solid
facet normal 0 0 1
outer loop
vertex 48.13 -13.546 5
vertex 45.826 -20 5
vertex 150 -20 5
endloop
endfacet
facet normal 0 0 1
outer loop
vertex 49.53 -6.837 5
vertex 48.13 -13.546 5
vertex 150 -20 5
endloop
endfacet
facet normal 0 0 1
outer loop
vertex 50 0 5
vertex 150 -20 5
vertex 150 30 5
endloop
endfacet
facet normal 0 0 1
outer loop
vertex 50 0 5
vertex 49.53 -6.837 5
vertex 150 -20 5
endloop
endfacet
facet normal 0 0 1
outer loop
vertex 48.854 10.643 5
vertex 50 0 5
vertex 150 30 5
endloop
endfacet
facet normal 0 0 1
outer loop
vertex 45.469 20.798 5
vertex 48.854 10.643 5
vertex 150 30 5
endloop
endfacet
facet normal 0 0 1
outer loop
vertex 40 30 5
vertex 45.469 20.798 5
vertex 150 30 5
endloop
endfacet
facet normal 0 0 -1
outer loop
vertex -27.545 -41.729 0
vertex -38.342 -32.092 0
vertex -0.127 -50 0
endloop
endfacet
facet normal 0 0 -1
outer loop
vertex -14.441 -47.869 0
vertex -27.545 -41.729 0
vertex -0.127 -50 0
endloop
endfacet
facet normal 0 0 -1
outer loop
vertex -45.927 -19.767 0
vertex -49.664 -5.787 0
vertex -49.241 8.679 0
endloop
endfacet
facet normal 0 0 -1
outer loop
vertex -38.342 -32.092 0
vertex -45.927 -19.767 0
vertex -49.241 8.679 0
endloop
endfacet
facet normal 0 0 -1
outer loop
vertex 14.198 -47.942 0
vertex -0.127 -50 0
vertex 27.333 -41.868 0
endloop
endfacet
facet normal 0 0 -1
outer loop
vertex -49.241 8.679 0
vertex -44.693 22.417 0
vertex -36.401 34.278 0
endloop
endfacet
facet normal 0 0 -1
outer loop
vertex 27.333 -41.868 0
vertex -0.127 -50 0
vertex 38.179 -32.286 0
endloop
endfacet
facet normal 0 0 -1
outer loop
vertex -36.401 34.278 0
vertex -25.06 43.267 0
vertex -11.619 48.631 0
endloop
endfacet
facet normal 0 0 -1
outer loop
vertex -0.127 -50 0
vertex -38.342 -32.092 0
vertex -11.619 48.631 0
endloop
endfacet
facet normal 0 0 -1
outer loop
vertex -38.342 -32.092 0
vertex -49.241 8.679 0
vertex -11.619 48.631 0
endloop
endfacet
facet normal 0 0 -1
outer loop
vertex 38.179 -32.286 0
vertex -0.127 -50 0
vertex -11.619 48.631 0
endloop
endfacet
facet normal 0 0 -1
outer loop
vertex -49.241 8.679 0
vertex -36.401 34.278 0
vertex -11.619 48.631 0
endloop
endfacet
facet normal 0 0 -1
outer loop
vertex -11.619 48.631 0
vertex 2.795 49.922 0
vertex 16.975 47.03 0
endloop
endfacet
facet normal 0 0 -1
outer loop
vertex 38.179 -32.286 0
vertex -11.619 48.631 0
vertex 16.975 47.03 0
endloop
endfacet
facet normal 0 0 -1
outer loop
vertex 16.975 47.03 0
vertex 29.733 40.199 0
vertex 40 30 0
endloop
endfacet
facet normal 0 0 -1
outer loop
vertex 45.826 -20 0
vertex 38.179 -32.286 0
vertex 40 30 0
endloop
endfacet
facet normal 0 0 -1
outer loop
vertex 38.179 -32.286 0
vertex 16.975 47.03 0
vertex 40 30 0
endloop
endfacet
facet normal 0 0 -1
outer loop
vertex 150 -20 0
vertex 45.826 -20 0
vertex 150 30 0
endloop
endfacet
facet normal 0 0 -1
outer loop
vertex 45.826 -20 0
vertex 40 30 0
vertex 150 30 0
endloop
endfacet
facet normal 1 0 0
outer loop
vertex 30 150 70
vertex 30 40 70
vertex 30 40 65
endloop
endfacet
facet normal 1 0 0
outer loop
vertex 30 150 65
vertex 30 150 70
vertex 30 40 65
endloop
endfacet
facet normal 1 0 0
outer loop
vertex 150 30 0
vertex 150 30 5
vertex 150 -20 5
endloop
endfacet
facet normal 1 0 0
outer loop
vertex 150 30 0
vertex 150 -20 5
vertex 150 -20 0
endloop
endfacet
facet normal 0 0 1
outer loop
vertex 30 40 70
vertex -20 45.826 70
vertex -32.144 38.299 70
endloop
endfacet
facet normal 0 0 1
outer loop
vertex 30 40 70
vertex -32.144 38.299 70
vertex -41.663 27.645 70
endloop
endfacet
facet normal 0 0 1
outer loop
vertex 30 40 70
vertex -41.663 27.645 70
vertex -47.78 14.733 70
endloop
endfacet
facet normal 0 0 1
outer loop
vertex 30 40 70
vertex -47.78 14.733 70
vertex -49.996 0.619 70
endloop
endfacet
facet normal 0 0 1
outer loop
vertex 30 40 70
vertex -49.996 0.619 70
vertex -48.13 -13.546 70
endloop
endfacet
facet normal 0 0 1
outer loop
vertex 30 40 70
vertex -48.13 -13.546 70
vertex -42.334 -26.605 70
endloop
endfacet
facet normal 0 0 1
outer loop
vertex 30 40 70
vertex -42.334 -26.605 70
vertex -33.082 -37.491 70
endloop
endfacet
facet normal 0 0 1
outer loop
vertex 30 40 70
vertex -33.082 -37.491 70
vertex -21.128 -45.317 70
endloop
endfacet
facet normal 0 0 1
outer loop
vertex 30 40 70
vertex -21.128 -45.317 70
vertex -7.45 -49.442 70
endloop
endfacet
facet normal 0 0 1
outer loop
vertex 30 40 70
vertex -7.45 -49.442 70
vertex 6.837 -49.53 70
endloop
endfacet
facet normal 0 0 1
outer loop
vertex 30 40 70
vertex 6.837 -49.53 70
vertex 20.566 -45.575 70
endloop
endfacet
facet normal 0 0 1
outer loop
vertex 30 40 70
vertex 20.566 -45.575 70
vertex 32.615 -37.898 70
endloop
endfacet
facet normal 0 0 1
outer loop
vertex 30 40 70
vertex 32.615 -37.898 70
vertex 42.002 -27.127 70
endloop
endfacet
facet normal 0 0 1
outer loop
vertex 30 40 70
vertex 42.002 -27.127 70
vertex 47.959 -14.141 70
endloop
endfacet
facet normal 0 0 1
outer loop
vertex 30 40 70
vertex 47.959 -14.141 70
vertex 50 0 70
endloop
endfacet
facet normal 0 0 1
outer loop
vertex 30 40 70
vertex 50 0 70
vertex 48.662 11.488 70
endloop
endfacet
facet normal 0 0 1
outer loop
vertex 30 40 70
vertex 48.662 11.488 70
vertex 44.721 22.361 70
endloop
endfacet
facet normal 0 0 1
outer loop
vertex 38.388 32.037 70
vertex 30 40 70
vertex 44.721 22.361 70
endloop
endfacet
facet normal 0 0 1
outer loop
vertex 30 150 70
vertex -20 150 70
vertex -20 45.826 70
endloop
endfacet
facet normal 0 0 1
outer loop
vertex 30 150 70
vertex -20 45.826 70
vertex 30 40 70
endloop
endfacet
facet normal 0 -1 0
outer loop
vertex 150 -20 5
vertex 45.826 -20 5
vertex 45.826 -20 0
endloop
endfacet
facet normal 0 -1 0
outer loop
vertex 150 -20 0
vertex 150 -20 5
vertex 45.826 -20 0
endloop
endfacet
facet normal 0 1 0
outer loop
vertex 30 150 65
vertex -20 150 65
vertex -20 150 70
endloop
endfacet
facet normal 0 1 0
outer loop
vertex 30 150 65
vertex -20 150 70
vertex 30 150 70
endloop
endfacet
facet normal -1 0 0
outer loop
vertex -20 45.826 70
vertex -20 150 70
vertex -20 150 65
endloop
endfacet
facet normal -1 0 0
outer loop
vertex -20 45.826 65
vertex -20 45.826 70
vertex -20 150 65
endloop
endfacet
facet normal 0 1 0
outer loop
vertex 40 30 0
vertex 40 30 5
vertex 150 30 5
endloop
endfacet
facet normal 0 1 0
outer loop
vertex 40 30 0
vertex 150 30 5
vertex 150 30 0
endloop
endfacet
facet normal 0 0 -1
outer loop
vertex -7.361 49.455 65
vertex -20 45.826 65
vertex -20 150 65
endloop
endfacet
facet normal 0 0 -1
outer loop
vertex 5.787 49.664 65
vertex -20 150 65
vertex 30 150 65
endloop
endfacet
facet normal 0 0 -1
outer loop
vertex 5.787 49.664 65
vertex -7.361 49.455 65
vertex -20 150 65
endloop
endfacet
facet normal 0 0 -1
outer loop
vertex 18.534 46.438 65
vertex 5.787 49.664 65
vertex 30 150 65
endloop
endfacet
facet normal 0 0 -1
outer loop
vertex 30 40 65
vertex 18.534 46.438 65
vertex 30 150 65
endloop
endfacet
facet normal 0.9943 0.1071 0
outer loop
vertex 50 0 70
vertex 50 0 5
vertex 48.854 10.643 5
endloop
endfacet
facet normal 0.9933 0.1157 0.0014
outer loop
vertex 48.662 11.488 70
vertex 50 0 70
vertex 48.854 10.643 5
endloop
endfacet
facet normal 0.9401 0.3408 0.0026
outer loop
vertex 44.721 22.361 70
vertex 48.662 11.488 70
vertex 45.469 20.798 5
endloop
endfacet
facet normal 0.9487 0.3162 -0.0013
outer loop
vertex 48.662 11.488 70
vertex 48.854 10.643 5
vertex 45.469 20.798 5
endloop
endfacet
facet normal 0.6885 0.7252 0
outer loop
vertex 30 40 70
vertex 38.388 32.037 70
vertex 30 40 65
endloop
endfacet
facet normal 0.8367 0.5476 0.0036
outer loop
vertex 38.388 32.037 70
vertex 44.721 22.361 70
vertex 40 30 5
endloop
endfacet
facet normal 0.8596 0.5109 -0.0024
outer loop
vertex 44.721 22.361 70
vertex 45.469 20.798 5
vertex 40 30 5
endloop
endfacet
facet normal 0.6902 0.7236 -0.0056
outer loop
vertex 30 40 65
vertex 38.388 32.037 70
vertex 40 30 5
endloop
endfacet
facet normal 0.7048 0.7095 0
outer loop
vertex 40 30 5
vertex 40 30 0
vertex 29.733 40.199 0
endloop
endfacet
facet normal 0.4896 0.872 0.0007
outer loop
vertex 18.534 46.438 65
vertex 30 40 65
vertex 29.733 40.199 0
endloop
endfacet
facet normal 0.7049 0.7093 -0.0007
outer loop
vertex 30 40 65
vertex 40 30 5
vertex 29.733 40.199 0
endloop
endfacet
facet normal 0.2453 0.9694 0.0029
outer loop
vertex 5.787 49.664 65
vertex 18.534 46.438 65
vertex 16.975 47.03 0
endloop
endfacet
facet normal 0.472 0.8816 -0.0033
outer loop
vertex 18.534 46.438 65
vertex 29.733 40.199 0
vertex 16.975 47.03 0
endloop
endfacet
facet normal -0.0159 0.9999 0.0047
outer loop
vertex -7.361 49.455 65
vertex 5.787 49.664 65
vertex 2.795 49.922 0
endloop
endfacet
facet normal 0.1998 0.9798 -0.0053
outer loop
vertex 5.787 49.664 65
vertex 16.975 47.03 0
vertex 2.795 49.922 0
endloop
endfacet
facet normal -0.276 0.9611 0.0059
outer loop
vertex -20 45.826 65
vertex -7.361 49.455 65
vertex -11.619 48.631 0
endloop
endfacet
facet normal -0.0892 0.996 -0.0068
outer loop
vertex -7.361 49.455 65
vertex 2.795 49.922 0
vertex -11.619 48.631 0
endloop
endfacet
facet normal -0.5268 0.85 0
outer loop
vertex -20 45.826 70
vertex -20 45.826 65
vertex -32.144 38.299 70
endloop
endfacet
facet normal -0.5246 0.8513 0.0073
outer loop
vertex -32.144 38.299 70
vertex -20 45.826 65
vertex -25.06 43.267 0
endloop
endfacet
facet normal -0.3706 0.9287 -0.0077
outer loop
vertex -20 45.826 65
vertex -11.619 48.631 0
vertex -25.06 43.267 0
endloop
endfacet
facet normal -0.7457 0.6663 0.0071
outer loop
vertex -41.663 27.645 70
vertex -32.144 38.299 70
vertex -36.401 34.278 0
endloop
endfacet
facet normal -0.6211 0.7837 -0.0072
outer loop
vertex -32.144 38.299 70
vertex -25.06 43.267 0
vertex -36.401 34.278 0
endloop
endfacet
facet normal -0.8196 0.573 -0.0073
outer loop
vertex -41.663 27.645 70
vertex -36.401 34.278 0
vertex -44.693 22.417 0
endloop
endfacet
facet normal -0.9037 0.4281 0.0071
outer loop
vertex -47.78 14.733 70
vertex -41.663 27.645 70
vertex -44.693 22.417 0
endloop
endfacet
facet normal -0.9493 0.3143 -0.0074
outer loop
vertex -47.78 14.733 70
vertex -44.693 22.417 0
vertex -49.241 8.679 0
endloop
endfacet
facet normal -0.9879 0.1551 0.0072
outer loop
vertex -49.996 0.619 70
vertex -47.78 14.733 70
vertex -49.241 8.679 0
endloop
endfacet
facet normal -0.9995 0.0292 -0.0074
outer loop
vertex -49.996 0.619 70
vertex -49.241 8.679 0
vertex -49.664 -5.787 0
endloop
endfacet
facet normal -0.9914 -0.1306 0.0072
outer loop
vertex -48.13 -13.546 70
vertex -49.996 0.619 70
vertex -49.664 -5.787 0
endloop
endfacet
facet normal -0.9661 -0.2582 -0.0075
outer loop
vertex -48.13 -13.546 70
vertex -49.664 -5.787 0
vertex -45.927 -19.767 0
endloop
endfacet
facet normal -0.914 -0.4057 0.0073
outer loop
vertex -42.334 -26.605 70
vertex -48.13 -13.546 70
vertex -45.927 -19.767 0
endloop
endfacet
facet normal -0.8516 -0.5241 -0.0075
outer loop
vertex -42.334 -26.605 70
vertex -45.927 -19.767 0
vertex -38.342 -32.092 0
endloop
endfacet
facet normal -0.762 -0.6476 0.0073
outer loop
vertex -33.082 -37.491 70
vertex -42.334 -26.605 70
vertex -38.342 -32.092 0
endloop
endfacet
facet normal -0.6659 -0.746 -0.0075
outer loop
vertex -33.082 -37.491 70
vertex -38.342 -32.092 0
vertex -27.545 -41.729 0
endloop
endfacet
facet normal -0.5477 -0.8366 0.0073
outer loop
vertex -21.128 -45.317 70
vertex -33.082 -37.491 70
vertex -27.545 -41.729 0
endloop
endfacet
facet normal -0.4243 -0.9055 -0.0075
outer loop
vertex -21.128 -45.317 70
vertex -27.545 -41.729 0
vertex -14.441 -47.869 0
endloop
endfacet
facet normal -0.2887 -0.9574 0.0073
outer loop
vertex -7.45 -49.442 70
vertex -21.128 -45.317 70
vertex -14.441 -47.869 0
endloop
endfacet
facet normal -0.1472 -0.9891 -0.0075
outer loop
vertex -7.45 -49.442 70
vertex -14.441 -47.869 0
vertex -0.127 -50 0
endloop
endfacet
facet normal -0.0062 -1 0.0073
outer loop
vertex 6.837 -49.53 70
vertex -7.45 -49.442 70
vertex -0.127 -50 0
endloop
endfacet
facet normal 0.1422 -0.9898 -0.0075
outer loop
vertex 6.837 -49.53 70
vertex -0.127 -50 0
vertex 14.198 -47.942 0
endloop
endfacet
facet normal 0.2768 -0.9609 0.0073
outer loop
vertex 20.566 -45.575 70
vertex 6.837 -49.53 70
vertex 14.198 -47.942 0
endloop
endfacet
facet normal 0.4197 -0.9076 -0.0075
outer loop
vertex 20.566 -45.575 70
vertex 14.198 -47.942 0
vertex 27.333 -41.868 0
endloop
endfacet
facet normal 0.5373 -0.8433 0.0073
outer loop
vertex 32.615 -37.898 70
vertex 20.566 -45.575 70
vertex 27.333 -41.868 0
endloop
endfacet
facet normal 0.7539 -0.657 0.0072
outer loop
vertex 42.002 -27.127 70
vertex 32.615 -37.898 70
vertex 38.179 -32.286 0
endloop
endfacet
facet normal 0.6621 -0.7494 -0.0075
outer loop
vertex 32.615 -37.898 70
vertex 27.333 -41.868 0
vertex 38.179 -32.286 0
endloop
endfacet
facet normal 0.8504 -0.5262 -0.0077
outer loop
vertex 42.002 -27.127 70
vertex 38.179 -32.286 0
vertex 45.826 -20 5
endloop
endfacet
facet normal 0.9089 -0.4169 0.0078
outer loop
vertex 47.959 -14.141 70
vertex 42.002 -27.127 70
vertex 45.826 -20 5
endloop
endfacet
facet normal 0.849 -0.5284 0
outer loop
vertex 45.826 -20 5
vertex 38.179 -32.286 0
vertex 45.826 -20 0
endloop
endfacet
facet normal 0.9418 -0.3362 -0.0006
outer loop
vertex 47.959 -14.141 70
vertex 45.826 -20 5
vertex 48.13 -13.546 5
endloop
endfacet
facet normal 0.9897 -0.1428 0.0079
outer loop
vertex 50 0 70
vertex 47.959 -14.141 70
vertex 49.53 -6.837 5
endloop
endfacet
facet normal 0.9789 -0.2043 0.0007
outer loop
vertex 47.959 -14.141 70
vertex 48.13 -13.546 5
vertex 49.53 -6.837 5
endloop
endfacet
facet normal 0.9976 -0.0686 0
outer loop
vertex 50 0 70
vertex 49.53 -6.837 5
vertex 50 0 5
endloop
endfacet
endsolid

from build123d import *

# Parameters (mm, degrees)
SKETCH1_R           = 50
BOSS_EXTRUDE1_DEPTH = 70
SKETCH2_W           = 50
SKETCH2_H           = 5
BOSS_EXTRUDE2_DEPTH = 150
SKETCH4_W           = 5
SKETCH4_H           = 50
BOSS_EXTRUDE3_DEPTH = 150


with BuildPart() as part:
    # Sketch1 → Boss-Extrude1 (new body)
    with BuildSketch(Plane.XY):
        Circle(SKETCH1_R)
    extrude(amount=BOSS_EXTRUDE1_DEPTH)

    # Sketch2 → Boss-Extrude2 (add)
    with BuildSketch(Plane(origin=(0, 0, 0), x_dir=(1, 0, 0), z_dir=(0, 1, 0))):
        with Locations((5, -67.5)):
            Rectangle(SKETCH2_W, SKETCH2_H)
    extrude(amount=BOSS_EXTRUDE2_DEPTH)

    # Sketch4 → Boss-Extrude3 (add)
    with BuildSketch(Plane(origin=(0, 0, 0), x_dir=(0, 0, -1), z_dir=(1, 0, 0))):
        with Locations((-2.5, 5)):
            Rectangle(SKETCH4_W, SKETCH4_H)
    extrude(amount=BOSS_EXTRUDE3_DEPTH)


solid = part.part
